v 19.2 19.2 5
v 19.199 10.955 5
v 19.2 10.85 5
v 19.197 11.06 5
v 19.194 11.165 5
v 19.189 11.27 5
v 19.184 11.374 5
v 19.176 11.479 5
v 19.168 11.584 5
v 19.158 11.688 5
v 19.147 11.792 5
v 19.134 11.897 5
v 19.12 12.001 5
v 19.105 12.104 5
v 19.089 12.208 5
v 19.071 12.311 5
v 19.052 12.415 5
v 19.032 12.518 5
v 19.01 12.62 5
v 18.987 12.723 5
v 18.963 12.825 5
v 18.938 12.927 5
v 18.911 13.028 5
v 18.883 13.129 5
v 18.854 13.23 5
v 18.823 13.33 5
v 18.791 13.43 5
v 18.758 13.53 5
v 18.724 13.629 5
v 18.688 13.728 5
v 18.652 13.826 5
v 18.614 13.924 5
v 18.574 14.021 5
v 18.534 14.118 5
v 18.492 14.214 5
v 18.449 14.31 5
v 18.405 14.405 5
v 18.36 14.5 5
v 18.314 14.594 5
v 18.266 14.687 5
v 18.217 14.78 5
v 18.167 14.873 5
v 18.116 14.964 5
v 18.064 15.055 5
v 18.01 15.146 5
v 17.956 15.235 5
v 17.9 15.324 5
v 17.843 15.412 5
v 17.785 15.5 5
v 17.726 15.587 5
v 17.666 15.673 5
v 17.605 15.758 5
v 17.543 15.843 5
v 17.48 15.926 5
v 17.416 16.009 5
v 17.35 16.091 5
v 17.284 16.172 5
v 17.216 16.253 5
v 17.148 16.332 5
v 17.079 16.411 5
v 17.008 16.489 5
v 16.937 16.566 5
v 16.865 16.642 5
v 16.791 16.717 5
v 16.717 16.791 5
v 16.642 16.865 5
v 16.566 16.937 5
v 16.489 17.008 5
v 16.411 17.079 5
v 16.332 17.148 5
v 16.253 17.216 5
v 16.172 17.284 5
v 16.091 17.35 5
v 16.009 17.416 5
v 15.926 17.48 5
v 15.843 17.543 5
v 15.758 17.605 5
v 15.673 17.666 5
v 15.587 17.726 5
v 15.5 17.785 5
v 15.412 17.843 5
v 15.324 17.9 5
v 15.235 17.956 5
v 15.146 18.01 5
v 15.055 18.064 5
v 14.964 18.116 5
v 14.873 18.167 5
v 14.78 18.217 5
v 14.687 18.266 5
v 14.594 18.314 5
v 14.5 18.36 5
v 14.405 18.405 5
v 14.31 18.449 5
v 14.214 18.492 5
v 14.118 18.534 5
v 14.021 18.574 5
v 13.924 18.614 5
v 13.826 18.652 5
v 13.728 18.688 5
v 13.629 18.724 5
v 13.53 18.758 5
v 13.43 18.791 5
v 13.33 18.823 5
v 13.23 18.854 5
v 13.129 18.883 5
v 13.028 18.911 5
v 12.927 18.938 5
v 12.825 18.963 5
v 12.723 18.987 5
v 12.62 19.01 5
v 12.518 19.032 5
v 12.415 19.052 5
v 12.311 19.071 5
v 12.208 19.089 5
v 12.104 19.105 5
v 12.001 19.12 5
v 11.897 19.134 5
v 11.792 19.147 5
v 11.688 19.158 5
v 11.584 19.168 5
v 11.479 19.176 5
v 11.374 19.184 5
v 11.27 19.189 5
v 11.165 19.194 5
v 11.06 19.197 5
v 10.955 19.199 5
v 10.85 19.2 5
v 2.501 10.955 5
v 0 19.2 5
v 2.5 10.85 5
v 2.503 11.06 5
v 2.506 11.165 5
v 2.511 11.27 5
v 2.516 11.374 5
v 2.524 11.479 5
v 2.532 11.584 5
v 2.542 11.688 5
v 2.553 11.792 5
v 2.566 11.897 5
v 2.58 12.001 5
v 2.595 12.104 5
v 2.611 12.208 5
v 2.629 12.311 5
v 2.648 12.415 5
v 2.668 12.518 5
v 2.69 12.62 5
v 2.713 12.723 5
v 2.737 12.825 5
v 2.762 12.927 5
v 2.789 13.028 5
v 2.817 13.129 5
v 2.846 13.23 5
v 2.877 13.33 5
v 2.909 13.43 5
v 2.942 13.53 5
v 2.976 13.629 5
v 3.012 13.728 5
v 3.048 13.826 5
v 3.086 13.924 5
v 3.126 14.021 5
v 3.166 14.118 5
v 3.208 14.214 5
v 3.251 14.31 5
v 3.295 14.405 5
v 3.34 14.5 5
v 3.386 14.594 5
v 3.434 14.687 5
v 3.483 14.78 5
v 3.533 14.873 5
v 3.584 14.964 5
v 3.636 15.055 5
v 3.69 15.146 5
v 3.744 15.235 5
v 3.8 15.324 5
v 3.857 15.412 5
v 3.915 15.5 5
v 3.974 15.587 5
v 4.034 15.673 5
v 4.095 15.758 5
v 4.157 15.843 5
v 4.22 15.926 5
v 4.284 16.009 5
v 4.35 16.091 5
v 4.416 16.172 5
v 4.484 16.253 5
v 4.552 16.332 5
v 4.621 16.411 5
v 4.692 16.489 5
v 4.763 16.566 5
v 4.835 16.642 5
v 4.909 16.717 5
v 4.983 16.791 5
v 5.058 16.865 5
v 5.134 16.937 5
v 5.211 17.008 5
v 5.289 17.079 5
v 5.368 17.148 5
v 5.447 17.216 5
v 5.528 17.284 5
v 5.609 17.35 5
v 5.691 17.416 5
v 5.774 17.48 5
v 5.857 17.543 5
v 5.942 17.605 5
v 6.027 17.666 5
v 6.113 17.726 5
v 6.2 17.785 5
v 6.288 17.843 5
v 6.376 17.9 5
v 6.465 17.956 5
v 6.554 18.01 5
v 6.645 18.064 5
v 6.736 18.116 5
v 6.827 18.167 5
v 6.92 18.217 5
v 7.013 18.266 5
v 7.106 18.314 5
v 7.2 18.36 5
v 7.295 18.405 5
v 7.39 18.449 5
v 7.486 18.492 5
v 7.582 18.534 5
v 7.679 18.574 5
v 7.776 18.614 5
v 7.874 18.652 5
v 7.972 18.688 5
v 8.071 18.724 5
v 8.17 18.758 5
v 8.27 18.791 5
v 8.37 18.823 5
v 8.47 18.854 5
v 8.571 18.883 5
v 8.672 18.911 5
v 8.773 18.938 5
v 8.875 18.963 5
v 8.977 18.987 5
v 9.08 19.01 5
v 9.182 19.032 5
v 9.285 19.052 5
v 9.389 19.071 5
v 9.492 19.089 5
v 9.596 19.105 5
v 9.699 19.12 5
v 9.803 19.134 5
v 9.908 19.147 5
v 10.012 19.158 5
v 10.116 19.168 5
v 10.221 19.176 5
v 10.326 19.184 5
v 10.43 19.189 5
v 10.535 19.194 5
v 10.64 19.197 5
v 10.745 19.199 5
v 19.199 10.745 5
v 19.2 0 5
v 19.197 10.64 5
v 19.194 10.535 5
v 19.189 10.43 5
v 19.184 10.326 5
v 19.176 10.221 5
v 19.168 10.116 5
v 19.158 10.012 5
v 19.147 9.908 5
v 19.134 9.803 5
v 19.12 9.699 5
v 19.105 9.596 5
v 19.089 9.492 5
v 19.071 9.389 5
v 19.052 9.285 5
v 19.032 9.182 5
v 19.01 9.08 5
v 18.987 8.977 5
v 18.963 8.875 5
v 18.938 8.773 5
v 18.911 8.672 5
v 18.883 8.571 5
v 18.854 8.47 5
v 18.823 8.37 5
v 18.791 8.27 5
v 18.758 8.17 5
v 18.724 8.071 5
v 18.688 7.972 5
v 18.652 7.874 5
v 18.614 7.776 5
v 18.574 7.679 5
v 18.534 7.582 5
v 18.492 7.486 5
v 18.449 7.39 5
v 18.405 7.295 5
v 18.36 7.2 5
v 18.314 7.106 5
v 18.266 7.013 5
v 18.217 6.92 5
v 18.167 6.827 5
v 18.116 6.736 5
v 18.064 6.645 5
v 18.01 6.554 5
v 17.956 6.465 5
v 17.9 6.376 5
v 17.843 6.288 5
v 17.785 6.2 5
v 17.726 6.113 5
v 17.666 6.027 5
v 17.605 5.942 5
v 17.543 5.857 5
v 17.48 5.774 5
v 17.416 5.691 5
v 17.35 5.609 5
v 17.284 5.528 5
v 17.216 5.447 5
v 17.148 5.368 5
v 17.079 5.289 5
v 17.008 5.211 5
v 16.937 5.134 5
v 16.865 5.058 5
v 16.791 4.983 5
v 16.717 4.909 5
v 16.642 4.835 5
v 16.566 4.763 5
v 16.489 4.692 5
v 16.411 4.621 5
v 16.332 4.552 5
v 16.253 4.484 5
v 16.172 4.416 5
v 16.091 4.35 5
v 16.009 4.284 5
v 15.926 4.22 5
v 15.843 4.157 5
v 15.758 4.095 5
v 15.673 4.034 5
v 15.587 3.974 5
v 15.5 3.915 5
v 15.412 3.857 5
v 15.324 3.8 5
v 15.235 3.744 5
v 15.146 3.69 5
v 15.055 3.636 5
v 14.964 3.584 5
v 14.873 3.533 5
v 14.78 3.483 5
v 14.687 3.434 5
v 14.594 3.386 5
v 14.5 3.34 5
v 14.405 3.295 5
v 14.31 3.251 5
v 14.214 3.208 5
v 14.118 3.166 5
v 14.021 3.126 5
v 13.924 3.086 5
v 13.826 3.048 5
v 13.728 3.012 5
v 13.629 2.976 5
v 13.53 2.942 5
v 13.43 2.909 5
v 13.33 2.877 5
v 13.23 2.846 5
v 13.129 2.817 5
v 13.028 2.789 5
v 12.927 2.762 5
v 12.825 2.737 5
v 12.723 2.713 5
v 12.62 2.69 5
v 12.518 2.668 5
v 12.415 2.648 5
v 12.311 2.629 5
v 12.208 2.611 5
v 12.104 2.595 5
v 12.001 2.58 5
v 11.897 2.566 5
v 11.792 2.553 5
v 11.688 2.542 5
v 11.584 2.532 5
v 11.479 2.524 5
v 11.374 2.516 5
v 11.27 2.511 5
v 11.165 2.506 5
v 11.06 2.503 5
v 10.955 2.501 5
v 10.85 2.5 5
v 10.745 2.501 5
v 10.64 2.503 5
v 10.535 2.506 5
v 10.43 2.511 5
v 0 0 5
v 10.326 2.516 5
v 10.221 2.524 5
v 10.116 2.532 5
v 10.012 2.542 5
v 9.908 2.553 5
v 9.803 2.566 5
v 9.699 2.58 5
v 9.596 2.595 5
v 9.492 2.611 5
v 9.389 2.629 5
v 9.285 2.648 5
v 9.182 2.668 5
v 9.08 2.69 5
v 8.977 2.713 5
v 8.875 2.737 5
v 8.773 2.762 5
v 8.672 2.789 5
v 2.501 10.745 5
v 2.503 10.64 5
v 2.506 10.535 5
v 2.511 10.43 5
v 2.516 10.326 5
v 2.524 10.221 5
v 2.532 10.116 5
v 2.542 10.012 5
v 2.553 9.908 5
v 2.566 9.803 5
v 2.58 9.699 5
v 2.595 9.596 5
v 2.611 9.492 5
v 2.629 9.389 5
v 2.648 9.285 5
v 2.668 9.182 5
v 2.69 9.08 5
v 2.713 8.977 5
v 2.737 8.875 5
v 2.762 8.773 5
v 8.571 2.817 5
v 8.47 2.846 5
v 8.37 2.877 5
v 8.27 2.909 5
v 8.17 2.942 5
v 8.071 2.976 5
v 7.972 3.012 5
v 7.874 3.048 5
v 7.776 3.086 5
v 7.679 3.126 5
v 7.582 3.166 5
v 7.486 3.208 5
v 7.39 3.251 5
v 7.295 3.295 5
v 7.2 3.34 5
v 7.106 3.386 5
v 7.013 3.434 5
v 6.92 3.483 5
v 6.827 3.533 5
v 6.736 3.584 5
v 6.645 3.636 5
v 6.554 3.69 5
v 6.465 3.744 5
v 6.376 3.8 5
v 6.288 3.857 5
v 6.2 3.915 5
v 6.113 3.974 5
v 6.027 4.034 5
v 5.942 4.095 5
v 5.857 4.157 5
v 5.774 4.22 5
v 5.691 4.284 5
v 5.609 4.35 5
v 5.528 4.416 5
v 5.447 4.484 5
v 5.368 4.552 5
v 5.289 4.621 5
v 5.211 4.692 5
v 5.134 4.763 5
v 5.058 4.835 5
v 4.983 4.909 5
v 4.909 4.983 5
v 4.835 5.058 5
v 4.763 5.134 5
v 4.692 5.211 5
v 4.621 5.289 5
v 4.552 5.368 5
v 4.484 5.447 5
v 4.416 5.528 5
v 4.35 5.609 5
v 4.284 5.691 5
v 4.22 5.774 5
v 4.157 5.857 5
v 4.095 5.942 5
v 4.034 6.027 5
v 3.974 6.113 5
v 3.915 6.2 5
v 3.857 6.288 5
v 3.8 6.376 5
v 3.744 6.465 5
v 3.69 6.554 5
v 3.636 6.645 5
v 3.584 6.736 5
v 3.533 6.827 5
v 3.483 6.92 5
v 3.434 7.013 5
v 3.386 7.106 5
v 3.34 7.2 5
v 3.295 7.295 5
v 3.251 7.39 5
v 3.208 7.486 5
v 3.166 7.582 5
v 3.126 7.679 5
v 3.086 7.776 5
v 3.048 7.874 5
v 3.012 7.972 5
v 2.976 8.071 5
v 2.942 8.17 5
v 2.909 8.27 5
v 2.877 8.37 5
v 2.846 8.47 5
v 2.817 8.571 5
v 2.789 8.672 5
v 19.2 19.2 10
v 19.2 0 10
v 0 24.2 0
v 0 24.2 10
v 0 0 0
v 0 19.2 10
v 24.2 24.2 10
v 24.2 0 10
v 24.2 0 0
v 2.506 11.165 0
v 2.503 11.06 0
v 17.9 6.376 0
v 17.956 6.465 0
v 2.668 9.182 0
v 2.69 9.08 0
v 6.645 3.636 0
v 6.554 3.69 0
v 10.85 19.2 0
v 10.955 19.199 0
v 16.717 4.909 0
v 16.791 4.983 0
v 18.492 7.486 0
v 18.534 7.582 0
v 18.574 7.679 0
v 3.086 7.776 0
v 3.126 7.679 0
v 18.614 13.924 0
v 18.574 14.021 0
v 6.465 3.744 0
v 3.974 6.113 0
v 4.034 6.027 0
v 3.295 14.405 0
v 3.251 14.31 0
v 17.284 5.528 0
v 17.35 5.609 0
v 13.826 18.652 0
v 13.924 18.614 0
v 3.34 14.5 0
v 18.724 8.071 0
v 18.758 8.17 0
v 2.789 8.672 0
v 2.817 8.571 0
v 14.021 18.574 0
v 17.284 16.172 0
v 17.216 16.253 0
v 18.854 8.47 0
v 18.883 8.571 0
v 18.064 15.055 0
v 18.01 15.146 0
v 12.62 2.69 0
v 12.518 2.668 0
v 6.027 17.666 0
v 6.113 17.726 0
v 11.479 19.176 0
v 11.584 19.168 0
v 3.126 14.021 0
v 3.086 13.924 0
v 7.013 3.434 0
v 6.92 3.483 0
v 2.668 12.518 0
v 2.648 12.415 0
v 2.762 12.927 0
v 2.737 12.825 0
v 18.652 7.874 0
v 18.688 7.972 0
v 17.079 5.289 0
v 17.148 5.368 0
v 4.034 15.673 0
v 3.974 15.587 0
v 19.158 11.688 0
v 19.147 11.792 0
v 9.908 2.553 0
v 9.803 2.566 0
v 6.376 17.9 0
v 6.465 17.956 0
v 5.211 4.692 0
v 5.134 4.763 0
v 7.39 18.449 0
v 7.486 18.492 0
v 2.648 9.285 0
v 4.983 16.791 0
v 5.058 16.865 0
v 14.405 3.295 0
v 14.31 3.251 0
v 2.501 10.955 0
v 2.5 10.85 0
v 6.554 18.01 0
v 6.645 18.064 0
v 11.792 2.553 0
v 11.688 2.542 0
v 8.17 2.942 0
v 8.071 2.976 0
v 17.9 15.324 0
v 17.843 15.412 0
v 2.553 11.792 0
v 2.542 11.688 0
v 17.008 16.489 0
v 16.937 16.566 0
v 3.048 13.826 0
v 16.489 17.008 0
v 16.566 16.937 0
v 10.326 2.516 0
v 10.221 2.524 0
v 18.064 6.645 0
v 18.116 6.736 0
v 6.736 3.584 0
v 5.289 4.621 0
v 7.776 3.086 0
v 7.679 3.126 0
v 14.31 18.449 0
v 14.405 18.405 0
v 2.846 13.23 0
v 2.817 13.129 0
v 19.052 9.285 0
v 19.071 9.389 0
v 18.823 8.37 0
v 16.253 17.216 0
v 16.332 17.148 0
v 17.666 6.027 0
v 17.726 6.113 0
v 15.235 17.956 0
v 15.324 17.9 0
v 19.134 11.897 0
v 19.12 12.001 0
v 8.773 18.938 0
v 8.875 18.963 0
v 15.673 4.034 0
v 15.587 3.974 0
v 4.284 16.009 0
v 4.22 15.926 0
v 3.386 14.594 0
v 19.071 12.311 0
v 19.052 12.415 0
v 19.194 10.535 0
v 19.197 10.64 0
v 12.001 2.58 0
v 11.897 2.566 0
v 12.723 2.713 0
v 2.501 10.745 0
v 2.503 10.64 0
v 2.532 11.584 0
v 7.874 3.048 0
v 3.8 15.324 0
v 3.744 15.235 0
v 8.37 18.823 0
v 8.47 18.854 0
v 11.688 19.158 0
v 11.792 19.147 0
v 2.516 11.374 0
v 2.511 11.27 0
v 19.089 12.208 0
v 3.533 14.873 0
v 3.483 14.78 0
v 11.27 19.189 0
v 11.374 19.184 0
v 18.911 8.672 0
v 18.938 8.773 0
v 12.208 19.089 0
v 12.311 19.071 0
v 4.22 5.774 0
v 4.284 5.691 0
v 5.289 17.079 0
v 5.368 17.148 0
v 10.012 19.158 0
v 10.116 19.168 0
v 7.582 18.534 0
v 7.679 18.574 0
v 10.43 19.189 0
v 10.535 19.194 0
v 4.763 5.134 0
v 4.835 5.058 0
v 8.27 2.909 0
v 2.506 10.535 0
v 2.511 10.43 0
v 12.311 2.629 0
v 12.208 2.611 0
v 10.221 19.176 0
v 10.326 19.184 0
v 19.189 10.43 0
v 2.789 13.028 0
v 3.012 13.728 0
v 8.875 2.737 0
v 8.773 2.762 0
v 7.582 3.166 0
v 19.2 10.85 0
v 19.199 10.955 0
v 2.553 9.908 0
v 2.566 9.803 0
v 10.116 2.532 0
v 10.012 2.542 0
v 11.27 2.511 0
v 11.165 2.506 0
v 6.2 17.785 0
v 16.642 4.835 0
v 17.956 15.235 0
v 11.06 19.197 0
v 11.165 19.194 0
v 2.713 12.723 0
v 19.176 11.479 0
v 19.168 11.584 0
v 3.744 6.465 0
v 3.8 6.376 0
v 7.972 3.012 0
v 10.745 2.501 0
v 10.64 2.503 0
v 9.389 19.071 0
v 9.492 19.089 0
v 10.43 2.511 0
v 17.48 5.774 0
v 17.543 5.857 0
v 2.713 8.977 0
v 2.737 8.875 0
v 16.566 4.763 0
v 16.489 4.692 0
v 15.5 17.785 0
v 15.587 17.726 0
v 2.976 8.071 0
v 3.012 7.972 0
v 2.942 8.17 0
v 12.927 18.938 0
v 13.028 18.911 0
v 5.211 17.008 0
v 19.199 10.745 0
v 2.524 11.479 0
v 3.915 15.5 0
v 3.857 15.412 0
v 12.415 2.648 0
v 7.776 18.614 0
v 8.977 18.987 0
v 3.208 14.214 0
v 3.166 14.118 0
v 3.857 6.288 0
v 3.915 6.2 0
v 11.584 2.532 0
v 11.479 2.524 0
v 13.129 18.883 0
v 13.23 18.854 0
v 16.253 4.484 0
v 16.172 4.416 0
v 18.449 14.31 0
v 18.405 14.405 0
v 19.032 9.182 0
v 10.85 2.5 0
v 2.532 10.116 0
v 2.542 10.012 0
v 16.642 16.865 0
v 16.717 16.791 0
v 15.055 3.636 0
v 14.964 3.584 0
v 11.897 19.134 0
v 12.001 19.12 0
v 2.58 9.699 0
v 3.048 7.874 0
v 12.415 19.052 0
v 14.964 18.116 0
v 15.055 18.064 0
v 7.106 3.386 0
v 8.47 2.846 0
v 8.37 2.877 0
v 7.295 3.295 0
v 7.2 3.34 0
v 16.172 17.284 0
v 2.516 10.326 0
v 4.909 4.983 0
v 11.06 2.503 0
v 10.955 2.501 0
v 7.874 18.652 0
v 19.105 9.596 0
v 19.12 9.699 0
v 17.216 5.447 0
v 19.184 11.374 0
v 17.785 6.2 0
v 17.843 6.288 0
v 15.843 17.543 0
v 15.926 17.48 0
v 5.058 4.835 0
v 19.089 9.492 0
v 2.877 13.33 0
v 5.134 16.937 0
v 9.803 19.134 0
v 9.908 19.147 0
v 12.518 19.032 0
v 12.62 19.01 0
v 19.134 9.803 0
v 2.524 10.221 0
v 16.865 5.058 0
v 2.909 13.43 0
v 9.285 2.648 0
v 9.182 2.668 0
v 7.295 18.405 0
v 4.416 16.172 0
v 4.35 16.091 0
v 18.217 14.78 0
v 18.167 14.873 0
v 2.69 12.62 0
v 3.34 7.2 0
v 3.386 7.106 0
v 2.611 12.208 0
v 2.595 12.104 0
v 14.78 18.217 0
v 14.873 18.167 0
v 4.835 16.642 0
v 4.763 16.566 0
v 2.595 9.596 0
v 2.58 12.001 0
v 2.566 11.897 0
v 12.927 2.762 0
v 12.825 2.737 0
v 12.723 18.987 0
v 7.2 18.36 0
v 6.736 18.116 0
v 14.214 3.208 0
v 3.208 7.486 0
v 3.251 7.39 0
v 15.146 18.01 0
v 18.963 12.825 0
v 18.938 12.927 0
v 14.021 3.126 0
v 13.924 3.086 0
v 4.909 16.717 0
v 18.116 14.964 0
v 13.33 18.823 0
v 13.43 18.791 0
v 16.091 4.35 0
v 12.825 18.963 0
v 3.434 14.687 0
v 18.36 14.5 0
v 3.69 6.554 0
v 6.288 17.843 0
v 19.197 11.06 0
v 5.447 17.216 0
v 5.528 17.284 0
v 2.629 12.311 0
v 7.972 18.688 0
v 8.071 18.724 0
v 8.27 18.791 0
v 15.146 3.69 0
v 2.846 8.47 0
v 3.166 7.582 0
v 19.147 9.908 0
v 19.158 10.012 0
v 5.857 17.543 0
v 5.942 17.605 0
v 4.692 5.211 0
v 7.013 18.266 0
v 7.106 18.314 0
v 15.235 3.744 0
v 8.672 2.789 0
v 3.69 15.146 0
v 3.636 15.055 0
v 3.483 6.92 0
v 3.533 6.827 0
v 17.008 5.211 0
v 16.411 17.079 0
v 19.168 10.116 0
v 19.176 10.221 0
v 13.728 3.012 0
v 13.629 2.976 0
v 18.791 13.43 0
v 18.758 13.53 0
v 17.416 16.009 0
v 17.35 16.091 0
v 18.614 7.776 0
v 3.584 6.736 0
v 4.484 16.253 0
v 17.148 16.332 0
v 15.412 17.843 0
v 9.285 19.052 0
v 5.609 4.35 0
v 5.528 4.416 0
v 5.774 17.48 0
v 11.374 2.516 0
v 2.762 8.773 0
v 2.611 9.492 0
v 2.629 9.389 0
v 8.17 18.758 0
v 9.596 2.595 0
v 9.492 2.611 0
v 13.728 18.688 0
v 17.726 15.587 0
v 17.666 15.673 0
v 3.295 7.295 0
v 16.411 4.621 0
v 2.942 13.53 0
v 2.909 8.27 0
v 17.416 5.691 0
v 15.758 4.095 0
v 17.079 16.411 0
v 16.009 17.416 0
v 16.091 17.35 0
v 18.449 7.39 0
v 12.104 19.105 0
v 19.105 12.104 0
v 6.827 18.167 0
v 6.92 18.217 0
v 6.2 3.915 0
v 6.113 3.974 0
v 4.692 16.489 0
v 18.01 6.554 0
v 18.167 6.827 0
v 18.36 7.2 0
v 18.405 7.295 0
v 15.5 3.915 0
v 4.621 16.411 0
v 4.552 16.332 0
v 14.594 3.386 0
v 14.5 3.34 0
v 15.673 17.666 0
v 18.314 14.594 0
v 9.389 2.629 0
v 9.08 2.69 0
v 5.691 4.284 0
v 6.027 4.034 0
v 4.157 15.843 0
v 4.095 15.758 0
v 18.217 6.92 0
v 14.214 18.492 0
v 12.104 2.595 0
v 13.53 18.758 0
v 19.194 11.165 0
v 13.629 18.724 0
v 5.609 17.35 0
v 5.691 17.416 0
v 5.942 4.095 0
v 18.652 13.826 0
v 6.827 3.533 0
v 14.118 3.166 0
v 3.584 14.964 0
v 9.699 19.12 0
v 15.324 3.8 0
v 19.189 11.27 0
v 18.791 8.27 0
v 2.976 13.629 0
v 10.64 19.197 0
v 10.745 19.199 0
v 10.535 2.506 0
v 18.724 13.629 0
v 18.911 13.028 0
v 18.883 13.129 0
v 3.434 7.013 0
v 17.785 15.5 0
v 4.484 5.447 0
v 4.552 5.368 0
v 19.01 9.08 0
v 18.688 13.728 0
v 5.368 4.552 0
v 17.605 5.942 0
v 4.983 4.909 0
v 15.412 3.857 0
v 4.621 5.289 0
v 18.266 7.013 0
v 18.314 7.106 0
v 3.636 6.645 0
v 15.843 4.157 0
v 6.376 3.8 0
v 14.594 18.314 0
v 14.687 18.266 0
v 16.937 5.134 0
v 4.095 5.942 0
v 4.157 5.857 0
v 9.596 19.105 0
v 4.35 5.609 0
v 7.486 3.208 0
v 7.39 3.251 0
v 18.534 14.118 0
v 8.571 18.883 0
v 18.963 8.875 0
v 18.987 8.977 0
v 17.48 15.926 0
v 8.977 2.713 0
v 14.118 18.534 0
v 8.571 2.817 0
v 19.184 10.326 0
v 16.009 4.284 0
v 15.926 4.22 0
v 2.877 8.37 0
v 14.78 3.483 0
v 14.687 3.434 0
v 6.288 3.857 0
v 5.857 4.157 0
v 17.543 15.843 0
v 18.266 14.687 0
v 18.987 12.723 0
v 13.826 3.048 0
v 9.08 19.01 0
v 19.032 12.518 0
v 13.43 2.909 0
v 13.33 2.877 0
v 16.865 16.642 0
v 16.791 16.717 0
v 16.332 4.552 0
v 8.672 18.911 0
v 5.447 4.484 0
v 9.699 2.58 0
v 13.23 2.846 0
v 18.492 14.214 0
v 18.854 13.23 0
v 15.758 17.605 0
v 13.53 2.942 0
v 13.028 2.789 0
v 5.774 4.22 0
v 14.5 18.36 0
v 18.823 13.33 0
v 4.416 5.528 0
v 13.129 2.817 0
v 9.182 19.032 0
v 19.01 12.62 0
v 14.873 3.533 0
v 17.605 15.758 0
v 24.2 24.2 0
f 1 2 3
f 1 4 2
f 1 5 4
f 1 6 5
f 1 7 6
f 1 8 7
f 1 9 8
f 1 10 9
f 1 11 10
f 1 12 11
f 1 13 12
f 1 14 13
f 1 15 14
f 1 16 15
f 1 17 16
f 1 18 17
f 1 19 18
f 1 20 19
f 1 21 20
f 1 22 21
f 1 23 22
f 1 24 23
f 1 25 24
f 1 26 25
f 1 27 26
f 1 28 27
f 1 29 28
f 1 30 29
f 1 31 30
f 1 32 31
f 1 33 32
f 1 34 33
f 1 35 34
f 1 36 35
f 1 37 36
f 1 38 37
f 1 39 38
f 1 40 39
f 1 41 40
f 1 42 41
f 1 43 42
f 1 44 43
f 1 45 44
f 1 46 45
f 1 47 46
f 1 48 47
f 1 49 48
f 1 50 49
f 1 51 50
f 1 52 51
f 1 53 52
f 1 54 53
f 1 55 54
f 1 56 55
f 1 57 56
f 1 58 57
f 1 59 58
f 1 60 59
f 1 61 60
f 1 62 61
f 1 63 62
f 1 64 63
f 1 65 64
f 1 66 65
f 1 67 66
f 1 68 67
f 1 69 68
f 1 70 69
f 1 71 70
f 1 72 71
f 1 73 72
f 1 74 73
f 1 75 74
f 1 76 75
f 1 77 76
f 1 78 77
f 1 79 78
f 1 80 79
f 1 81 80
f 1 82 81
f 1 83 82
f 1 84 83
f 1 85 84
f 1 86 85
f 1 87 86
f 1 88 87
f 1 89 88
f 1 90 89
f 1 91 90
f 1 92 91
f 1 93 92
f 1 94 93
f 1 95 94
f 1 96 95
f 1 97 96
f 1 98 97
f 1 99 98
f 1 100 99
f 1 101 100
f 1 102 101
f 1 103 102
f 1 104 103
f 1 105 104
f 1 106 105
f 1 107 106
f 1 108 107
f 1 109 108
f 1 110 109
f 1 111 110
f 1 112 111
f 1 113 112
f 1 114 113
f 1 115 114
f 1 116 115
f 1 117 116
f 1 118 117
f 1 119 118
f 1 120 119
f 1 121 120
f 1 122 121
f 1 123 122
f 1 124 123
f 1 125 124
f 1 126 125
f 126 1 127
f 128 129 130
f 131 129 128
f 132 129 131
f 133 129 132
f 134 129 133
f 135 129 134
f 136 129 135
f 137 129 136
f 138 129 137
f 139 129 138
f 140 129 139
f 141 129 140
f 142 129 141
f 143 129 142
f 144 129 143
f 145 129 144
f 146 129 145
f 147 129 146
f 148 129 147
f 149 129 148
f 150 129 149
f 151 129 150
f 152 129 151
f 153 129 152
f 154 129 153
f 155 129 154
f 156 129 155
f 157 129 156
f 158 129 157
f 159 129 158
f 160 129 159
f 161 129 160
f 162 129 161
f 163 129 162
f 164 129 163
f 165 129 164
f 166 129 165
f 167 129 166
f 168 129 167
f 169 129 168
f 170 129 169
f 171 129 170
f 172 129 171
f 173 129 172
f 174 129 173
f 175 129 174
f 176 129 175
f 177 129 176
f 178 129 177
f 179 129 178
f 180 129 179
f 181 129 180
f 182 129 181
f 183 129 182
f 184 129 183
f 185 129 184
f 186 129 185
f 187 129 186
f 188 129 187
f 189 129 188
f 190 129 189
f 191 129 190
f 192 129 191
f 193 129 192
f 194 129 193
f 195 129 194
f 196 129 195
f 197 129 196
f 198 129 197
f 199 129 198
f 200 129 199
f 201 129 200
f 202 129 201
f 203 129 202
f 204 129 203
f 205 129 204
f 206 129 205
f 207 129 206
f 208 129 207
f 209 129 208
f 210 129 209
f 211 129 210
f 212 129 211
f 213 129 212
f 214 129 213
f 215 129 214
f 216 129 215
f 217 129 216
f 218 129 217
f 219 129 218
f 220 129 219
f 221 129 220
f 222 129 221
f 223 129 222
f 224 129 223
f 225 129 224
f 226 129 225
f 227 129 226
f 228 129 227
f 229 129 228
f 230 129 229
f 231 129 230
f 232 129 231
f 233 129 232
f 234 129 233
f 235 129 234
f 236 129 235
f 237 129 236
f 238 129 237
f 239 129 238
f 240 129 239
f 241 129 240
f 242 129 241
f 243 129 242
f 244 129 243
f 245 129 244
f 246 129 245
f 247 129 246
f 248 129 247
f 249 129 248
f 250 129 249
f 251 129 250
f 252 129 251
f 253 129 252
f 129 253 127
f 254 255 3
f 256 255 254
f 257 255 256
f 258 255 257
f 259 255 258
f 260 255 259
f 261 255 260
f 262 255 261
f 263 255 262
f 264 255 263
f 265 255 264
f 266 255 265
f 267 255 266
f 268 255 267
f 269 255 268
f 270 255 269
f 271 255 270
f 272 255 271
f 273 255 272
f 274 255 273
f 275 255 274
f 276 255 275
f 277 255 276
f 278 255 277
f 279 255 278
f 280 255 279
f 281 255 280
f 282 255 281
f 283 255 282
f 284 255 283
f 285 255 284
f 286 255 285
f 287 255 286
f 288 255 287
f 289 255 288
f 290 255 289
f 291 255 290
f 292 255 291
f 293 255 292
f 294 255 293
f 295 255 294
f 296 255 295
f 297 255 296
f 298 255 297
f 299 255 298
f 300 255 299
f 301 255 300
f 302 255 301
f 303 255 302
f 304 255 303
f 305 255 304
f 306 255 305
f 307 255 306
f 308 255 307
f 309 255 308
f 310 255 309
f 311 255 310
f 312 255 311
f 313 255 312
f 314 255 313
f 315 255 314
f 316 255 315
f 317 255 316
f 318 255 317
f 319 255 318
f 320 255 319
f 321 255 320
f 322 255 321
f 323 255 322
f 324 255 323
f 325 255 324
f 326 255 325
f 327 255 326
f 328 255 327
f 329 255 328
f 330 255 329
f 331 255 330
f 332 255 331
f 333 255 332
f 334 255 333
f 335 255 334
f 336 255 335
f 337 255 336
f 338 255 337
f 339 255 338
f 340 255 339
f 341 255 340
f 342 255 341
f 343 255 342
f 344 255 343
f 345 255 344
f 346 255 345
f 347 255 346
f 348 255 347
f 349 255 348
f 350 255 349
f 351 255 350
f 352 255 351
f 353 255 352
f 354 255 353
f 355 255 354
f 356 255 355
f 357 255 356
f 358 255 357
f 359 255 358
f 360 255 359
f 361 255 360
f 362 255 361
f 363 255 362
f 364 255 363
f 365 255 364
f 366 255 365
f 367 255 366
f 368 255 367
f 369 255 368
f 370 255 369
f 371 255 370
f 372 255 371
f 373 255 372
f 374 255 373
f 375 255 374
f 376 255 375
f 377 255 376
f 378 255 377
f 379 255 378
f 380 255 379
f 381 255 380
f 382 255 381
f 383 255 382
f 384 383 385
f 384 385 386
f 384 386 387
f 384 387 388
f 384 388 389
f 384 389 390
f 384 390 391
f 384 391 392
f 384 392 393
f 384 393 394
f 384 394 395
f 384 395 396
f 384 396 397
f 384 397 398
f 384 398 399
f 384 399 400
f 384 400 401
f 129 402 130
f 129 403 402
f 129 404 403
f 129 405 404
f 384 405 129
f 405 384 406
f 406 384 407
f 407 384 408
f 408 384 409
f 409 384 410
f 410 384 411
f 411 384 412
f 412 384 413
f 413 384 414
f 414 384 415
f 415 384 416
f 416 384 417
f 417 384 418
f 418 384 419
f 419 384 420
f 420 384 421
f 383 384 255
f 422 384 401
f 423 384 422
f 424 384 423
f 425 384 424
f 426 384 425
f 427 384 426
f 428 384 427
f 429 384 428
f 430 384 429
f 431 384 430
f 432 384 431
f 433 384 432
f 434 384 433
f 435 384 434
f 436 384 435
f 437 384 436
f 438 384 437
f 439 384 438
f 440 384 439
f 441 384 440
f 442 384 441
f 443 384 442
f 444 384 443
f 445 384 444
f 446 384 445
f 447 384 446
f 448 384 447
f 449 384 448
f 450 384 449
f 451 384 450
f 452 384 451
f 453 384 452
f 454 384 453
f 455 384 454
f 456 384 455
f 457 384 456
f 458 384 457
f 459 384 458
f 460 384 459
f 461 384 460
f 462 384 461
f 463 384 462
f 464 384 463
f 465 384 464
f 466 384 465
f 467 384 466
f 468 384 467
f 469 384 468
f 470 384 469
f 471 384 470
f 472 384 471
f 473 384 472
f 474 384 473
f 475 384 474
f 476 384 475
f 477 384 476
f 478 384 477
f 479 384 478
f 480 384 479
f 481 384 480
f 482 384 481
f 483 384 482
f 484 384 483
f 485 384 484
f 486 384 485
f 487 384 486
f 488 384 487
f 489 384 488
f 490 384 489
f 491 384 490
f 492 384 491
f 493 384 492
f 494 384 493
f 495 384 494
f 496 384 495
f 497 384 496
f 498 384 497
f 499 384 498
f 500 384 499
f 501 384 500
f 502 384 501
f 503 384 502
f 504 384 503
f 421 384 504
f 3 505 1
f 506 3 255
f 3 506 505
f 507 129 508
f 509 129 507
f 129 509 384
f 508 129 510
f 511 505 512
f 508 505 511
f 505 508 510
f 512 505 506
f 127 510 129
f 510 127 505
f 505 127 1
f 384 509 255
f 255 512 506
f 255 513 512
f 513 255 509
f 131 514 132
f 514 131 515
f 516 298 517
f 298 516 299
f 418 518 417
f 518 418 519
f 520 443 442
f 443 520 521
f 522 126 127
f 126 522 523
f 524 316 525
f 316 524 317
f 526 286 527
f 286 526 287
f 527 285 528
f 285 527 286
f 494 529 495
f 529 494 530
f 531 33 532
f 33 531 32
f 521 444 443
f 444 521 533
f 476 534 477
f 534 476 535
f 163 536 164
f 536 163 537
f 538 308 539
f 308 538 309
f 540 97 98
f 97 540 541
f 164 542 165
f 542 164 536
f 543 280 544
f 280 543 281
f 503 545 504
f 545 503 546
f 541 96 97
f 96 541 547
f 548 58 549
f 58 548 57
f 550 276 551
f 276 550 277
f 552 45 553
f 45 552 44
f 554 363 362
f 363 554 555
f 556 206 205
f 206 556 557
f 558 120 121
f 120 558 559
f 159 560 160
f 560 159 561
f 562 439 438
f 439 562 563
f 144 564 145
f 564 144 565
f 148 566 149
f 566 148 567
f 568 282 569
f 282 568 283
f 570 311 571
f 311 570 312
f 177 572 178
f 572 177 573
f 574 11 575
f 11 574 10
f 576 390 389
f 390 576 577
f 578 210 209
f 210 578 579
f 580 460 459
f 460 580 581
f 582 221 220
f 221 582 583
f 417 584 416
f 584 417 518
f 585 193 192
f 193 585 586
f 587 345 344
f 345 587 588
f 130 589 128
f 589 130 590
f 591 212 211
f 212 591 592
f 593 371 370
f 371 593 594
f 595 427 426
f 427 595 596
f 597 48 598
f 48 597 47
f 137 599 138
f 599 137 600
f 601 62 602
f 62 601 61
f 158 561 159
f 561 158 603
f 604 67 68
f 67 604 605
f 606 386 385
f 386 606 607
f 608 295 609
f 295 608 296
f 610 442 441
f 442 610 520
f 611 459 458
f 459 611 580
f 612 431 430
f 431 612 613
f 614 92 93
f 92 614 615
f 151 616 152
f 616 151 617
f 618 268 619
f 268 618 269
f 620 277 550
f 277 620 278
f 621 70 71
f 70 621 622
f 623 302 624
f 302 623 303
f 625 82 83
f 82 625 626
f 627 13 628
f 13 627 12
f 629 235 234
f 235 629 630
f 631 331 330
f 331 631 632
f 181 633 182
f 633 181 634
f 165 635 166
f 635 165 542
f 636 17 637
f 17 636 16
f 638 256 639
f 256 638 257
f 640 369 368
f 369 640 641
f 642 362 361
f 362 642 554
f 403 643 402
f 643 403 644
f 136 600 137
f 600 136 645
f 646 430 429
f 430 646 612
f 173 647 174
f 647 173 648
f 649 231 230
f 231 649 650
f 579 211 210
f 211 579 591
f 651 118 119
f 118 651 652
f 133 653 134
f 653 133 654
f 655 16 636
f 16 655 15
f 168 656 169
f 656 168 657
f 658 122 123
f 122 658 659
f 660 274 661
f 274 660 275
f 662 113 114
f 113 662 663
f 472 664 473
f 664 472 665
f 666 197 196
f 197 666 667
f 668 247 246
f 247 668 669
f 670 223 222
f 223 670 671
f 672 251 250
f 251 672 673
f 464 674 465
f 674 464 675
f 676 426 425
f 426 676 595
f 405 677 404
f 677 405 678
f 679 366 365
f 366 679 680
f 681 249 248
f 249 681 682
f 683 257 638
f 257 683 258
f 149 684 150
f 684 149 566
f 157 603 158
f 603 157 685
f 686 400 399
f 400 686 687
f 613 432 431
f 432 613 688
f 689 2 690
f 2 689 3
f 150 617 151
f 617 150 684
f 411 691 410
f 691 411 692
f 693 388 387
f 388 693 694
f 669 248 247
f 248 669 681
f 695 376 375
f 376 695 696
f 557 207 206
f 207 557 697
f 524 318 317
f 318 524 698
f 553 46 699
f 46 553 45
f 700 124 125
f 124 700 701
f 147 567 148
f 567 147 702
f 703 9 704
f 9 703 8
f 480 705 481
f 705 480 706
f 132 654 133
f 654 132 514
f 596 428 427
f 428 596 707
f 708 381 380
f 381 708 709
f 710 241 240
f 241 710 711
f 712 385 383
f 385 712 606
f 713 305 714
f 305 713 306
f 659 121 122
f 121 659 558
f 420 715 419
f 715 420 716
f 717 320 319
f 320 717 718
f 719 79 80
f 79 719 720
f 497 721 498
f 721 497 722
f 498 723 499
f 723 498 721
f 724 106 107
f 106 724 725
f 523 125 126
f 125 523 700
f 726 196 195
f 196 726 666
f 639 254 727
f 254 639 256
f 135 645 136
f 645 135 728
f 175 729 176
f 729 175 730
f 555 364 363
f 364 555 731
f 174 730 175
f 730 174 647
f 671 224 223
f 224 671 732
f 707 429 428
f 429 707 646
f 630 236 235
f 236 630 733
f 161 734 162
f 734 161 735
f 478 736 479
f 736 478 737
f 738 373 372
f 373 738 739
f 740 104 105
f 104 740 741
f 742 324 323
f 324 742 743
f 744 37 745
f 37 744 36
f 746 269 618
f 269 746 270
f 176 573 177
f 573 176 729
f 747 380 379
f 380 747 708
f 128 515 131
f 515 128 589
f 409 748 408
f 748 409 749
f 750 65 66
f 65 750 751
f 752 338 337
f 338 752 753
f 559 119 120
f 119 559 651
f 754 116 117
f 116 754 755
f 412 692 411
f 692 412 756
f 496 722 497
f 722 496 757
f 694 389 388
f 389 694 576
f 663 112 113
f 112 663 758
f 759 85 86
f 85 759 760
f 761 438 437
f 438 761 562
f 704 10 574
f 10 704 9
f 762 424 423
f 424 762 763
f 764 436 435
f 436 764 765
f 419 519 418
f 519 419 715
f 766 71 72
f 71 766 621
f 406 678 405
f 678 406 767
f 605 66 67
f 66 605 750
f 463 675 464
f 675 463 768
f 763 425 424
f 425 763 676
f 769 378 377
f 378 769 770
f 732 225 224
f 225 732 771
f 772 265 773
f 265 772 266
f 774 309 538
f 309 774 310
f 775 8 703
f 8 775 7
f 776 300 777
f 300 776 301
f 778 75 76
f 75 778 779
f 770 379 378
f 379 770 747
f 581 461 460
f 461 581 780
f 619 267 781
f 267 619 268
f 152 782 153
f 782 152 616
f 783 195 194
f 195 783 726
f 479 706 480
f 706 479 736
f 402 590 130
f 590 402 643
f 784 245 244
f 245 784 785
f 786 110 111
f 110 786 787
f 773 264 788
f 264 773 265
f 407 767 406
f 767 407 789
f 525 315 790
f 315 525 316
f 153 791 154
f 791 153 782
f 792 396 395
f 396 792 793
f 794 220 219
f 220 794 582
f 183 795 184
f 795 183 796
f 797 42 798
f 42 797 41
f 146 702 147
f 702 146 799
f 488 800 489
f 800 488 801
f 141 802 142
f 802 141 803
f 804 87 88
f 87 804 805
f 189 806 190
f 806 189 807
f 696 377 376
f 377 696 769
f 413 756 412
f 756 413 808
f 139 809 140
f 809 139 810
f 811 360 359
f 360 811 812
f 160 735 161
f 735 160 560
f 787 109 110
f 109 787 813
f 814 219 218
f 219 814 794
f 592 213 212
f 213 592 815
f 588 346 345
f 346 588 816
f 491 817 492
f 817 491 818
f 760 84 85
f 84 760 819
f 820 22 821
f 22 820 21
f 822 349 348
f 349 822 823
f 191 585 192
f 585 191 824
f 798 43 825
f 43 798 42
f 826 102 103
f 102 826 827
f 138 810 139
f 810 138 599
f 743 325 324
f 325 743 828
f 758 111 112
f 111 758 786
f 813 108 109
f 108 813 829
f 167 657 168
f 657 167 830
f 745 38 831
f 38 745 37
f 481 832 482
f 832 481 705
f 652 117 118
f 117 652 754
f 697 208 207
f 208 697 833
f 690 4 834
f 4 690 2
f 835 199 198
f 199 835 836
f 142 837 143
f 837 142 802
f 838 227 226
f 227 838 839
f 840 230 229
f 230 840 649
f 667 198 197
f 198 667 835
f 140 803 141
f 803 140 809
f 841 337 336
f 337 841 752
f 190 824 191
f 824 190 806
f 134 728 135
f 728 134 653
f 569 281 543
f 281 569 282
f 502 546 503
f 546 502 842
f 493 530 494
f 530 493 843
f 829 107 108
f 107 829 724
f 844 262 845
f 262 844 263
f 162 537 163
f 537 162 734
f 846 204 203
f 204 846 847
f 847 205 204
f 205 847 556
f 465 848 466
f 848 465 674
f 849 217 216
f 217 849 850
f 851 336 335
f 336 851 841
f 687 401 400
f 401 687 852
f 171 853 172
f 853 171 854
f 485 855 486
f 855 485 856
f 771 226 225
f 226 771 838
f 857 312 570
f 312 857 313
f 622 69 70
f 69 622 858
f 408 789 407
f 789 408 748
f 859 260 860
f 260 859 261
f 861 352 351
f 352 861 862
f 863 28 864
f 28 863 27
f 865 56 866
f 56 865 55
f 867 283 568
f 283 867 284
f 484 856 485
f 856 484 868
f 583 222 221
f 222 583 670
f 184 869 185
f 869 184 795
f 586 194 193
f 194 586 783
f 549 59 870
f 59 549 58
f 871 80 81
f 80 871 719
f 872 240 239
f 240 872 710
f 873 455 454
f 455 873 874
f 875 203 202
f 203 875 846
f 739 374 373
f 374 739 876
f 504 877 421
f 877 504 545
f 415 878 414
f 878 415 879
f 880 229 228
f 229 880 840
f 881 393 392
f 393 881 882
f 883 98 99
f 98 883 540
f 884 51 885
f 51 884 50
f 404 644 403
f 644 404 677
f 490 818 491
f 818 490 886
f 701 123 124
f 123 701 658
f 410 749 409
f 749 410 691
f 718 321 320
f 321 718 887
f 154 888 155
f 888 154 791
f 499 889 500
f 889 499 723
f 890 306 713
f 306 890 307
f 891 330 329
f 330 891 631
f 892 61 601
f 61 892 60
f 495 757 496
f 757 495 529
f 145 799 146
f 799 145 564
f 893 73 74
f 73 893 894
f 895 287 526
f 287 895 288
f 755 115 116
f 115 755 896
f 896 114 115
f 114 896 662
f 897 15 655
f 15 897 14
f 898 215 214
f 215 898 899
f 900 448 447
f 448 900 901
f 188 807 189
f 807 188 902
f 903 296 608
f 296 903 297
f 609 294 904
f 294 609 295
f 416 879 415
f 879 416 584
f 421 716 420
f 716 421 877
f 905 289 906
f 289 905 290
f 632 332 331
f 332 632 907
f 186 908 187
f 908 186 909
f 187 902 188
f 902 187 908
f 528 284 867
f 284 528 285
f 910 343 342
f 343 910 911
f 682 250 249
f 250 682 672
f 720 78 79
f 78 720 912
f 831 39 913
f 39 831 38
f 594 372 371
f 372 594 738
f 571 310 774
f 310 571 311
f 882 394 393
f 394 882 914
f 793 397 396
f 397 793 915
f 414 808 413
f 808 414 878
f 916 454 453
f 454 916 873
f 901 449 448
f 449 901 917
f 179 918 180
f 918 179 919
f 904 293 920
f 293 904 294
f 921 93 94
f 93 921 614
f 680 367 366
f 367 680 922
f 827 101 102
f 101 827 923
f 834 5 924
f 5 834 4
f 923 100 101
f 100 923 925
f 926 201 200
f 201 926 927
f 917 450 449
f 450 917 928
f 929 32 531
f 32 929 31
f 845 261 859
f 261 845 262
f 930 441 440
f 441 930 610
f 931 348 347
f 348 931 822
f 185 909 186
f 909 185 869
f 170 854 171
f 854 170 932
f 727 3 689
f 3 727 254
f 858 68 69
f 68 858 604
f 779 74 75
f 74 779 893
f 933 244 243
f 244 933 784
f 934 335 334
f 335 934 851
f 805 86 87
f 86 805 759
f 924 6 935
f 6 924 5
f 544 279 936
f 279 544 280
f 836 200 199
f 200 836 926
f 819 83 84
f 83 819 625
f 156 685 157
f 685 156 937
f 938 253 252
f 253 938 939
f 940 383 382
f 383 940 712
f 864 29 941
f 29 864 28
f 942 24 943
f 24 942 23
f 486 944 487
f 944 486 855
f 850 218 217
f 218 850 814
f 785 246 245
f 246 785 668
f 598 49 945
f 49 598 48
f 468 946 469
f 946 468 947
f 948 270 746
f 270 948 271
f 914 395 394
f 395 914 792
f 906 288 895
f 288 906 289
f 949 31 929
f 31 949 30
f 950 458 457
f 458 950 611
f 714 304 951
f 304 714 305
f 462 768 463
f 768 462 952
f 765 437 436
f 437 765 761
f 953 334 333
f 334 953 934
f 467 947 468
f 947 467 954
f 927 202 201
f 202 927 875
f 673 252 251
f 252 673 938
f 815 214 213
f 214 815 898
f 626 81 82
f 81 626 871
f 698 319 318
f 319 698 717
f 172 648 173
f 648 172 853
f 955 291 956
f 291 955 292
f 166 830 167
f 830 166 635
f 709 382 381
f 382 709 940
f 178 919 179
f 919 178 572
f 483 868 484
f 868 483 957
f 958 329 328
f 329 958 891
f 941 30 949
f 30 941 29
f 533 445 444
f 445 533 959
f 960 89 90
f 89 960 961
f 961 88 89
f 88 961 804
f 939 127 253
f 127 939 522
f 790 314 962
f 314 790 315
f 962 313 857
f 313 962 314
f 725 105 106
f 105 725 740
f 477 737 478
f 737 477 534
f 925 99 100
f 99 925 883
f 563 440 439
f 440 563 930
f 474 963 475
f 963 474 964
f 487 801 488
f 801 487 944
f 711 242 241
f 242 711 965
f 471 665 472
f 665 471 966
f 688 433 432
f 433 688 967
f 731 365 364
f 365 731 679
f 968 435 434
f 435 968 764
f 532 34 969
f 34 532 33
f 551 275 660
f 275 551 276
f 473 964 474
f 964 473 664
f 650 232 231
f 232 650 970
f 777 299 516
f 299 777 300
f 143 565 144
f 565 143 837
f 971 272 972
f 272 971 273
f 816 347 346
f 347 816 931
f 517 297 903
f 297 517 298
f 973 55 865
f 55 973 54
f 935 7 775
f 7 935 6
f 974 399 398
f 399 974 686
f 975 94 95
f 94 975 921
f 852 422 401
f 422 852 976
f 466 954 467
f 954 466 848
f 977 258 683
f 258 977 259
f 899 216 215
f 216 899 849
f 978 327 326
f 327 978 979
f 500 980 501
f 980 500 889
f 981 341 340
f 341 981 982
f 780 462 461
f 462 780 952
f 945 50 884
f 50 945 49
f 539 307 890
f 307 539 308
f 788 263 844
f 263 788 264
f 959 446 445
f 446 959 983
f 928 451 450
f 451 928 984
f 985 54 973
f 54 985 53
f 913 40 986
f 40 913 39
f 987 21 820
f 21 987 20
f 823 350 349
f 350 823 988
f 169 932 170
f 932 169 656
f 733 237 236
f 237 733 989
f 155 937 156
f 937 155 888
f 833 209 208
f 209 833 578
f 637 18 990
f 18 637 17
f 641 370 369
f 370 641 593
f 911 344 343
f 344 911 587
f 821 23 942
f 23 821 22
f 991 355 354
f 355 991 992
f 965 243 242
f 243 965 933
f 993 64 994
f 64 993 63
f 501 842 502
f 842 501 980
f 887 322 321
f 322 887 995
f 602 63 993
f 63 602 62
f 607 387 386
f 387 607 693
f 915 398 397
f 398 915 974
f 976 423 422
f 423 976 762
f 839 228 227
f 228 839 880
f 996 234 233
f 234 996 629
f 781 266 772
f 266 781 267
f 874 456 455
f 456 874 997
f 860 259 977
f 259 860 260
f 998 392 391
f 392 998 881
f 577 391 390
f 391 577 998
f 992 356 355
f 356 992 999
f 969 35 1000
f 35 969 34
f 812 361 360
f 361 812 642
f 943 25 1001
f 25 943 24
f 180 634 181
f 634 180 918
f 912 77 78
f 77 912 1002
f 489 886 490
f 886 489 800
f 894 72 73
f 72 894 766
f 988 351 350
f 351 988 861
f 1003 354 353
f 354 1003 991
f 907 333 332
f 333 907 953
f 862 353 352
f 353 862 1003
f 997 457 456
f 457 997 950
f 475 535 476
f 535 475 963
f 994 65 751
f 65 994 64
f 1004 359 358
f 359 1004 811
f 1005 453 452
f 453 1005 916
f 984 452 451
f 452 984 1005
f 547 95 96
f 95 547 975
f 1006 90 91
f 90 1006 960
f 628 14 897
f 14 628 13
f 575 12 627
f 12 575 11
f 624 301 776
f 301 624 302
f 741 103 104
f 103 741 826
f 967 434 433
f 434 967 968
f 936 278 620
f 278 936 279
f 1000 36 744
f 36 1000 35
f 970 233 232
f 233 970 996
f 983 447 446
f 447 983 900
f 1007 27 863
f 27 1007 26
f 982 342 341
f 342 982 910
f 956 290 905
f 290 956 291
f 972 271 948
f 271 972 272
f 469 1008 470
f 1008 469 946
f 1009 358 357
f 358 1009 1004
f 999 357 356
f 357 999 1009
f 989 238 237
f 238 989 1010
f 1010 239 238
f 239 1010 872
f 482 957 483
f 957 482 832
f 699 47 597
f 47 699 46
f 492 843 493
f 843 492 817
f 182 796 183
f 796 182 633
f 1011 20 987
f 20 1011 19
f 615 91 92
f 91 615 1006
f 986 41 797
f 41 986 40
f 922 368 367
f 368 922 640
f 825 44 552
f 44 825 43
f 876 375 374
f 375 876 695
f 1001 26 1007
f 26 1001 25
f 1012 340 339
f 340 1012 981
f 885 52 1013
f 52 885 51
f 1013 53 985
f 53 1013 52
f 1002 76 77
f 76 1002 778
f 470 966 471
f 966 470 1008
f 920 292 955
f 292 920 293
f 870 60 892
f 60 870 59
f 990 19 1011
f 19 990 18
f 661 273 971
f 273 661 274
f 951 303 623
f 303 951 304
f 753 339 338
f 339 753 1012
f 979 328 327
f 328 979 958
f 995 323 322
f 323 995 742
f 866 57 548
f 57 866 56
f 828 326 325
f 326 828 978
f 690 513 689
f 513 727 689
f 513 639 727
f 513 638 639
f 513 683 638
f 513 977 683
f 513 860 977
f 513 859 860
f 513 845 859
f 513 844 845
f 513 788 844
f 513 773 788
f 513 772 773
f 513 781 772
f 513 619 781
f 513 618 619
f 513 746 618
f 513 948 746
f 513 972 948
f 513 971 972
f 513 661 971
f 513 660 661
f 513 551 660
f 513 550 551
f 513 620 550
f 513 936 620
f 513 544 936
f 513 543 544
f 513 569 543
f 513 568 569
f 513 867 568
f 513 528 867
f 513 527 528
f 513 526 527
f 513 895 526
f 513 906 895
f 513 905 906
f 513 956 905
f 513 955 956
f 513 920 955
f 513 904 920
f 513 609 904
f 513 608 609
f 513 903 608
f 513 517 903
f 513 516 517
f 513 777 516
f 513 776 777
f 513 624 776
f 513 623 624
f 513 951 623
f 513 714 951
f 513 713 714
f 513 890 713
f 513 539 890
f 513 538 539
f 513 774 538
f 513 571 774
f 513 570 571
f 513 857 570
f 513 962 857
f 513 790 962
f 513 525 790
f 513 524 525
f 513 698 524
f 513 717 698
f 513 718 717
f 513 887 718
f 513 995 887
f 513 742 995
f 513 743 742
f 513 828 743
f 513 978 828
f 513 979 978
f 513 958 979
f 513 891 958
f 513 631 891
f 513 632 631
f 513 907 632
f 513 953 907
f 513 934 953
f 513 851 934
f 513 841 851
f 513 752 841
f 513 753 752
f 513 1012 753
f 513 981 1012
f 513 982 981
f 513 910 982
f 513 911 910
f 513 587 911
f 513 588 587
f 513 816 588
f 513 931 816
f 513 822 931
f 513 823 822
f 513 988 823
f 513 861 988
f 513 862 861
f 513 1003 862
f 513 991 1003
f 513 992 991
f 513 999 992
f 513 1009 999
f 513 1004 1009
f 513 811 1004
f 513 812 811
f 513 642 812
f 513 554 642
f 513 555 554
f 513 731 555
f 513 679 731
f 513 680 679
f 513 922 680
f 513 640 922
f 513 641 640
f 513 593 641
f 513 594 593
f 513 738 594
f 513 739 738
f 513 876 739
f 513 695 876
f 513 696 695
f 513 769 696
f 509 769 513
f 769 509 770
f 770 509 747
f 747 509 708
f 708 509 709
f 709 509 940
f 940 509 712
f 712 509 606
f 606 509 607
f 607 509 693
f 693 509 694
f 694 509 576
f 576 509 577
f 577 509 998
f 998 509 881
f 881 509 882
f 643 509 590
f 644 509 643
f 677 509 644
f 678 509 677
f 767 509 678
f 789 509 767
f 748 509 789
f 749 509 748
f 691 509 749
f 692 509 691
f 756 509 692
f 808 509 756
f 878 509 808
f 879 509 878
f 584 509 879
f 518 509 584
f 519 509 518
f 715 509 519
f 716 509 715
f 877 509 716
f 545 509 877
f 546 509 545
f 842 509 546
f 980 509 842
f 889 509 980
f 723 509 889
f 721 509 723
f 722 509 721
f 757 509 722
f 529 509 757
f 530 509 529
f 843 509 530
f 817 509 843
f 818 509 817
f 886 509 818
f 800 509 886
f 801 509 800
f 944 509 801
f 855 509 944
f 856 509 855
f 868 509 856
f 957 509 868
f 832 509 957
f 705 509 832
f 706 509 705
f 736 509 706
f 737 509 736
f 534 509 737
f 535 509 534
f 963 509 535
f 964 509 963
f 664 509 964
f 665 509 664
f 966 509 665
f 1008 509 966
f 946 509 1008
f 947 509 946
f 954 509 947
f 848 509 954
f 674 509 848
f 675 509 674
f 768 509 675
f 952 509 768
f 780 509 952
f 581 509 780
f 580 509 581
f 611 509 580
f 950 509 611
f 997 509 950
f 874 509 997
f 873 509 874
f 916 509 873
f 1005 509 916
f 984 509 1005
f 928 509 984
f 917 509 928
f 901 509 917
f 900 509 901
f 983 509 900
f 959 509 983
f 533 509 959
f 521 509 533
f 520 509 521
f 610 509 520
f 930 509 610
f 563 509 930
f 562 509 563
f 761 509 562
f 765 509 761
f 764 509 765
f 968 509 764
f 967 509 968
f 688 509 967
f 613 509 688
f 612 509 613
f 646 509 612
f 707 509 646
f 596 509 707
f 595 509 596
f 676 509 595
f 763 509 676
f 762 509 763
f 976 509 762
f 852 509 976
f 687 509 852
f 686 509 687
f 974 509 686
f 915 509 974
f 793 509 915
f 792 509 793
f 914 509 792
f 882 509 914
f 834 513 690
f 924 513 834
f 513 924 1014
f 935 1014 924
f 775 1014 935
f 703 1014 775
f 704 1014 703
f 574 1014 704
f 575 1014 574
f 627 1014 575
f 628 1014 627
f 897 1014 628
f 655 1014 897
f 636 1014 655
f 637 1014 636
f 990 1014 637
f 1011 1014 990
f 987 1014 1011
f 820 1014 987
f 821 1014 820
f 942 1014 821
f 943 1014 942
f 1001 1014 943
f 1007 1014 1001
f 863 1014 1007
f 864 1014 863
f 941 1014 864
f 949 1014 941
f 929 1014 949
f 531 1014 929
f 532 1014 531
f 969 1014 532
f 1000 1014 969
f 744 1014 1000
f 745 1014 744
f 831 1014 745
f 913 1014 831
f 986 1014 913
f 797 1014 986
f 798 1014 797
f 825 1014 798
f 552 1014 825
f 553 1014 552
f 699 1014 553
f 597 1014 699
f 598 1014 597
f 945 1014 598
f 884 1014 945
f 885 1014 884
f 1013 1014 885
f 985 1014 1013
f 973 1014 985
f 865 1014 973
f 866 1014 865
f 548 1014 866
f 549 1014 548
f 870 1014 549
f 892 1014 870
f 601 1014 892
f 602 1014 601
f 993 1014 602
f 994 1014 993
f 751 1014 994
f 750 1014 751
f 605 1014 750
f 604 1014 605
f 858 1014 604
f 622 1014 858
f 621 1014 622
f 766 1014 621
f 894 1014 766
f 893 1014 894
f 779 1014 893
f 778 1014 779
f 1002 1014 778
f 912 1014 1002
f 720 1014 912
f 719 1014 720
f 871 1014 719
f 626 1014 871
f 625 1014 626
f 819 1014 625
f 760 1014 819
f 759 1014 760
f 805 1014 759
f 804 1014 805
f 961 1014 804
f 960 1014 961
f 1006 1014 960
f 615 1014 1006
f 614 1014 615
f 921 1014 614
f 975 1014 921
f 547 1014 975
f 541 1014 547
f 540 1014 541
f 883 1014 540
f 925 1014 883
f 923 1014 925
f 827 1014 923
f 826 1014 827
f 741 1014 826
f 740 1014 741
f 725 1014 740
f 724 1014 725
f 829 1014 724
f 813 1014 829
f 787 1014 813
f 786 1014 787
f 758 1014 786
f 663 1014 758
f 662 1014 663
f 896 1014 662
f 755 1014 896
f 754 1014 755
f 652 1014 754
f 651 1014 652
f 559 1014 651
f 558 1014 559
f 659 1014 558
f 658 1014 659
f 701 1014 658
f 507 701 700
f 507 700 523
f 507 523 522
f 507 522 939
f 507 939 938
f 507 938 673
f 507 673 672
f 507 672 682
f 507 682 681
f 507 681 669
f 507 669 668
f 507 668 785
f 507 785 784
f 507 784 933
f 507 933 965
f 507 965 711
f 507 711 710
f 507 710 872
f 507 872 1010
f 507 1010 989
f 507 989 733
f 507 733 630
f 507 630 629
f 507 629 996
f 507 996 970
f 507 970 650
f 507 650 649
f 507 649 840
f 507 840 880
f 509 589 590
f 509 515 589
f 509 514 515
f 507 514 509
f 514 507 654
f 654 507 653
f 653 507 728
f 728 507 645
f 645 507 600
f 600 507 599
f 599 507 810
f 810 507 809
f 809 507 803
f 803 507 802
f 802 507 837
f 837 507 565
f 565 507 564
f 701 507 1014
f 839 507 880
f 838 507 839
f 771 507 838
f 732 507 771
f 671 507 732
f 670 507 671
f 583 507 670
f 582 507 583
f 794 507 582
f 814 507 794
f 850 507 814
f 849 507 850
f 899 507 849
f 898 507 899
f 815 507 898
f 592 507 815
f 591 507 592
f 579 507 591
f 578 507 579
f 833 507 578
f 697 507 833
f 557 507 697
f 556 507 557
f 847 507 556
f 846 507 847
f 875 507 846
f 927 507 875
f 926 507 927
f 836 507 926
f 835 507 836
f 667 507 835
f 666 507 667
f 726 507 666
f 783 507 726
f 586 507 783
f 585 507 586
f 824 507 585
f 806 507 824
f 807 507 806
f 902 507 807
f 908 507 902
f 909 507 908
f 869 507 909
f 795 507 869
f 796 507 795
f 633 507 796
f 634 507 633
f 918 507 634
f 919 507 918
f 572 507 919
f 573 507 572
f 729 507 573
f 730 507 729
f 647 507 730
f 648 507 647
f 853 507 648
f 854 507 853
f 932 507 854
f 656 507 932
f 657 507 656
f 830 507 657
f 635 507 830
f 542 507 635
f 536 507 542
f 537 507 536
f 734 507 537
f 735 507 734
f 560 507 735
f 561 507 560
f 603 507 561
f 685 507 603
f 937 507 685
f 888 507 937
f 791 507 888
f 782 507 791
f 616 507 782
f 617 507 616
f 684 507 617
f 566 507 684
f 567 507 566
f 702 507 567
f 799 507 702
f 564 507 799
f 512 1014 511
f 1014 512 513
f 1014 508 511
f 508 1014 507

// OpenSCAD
/*
Shape intended to hold the wheels in exactly the right place in a clamp, while slotting them onto their axles
*/

wheel_max_d = 16.5+0.2;

lip = 5;
size = wheel_max_d + 2.5 + lip;
thick = 10;

//place it flat...
translate([0,0,thick])rotate([0,90,0])
difference(){
	cube([thick,size,size]);
	union(){
		cube([thick-lip,size-lip,size-lip]);
		translate([0,size-lip-wheel_max_d/2,size-lip-wheel_max_d/2])rotate([0,90,0])cylinder(r=wheel_max_d/2,h=thick*2.5,center=true,$fn=500);
	}
}
